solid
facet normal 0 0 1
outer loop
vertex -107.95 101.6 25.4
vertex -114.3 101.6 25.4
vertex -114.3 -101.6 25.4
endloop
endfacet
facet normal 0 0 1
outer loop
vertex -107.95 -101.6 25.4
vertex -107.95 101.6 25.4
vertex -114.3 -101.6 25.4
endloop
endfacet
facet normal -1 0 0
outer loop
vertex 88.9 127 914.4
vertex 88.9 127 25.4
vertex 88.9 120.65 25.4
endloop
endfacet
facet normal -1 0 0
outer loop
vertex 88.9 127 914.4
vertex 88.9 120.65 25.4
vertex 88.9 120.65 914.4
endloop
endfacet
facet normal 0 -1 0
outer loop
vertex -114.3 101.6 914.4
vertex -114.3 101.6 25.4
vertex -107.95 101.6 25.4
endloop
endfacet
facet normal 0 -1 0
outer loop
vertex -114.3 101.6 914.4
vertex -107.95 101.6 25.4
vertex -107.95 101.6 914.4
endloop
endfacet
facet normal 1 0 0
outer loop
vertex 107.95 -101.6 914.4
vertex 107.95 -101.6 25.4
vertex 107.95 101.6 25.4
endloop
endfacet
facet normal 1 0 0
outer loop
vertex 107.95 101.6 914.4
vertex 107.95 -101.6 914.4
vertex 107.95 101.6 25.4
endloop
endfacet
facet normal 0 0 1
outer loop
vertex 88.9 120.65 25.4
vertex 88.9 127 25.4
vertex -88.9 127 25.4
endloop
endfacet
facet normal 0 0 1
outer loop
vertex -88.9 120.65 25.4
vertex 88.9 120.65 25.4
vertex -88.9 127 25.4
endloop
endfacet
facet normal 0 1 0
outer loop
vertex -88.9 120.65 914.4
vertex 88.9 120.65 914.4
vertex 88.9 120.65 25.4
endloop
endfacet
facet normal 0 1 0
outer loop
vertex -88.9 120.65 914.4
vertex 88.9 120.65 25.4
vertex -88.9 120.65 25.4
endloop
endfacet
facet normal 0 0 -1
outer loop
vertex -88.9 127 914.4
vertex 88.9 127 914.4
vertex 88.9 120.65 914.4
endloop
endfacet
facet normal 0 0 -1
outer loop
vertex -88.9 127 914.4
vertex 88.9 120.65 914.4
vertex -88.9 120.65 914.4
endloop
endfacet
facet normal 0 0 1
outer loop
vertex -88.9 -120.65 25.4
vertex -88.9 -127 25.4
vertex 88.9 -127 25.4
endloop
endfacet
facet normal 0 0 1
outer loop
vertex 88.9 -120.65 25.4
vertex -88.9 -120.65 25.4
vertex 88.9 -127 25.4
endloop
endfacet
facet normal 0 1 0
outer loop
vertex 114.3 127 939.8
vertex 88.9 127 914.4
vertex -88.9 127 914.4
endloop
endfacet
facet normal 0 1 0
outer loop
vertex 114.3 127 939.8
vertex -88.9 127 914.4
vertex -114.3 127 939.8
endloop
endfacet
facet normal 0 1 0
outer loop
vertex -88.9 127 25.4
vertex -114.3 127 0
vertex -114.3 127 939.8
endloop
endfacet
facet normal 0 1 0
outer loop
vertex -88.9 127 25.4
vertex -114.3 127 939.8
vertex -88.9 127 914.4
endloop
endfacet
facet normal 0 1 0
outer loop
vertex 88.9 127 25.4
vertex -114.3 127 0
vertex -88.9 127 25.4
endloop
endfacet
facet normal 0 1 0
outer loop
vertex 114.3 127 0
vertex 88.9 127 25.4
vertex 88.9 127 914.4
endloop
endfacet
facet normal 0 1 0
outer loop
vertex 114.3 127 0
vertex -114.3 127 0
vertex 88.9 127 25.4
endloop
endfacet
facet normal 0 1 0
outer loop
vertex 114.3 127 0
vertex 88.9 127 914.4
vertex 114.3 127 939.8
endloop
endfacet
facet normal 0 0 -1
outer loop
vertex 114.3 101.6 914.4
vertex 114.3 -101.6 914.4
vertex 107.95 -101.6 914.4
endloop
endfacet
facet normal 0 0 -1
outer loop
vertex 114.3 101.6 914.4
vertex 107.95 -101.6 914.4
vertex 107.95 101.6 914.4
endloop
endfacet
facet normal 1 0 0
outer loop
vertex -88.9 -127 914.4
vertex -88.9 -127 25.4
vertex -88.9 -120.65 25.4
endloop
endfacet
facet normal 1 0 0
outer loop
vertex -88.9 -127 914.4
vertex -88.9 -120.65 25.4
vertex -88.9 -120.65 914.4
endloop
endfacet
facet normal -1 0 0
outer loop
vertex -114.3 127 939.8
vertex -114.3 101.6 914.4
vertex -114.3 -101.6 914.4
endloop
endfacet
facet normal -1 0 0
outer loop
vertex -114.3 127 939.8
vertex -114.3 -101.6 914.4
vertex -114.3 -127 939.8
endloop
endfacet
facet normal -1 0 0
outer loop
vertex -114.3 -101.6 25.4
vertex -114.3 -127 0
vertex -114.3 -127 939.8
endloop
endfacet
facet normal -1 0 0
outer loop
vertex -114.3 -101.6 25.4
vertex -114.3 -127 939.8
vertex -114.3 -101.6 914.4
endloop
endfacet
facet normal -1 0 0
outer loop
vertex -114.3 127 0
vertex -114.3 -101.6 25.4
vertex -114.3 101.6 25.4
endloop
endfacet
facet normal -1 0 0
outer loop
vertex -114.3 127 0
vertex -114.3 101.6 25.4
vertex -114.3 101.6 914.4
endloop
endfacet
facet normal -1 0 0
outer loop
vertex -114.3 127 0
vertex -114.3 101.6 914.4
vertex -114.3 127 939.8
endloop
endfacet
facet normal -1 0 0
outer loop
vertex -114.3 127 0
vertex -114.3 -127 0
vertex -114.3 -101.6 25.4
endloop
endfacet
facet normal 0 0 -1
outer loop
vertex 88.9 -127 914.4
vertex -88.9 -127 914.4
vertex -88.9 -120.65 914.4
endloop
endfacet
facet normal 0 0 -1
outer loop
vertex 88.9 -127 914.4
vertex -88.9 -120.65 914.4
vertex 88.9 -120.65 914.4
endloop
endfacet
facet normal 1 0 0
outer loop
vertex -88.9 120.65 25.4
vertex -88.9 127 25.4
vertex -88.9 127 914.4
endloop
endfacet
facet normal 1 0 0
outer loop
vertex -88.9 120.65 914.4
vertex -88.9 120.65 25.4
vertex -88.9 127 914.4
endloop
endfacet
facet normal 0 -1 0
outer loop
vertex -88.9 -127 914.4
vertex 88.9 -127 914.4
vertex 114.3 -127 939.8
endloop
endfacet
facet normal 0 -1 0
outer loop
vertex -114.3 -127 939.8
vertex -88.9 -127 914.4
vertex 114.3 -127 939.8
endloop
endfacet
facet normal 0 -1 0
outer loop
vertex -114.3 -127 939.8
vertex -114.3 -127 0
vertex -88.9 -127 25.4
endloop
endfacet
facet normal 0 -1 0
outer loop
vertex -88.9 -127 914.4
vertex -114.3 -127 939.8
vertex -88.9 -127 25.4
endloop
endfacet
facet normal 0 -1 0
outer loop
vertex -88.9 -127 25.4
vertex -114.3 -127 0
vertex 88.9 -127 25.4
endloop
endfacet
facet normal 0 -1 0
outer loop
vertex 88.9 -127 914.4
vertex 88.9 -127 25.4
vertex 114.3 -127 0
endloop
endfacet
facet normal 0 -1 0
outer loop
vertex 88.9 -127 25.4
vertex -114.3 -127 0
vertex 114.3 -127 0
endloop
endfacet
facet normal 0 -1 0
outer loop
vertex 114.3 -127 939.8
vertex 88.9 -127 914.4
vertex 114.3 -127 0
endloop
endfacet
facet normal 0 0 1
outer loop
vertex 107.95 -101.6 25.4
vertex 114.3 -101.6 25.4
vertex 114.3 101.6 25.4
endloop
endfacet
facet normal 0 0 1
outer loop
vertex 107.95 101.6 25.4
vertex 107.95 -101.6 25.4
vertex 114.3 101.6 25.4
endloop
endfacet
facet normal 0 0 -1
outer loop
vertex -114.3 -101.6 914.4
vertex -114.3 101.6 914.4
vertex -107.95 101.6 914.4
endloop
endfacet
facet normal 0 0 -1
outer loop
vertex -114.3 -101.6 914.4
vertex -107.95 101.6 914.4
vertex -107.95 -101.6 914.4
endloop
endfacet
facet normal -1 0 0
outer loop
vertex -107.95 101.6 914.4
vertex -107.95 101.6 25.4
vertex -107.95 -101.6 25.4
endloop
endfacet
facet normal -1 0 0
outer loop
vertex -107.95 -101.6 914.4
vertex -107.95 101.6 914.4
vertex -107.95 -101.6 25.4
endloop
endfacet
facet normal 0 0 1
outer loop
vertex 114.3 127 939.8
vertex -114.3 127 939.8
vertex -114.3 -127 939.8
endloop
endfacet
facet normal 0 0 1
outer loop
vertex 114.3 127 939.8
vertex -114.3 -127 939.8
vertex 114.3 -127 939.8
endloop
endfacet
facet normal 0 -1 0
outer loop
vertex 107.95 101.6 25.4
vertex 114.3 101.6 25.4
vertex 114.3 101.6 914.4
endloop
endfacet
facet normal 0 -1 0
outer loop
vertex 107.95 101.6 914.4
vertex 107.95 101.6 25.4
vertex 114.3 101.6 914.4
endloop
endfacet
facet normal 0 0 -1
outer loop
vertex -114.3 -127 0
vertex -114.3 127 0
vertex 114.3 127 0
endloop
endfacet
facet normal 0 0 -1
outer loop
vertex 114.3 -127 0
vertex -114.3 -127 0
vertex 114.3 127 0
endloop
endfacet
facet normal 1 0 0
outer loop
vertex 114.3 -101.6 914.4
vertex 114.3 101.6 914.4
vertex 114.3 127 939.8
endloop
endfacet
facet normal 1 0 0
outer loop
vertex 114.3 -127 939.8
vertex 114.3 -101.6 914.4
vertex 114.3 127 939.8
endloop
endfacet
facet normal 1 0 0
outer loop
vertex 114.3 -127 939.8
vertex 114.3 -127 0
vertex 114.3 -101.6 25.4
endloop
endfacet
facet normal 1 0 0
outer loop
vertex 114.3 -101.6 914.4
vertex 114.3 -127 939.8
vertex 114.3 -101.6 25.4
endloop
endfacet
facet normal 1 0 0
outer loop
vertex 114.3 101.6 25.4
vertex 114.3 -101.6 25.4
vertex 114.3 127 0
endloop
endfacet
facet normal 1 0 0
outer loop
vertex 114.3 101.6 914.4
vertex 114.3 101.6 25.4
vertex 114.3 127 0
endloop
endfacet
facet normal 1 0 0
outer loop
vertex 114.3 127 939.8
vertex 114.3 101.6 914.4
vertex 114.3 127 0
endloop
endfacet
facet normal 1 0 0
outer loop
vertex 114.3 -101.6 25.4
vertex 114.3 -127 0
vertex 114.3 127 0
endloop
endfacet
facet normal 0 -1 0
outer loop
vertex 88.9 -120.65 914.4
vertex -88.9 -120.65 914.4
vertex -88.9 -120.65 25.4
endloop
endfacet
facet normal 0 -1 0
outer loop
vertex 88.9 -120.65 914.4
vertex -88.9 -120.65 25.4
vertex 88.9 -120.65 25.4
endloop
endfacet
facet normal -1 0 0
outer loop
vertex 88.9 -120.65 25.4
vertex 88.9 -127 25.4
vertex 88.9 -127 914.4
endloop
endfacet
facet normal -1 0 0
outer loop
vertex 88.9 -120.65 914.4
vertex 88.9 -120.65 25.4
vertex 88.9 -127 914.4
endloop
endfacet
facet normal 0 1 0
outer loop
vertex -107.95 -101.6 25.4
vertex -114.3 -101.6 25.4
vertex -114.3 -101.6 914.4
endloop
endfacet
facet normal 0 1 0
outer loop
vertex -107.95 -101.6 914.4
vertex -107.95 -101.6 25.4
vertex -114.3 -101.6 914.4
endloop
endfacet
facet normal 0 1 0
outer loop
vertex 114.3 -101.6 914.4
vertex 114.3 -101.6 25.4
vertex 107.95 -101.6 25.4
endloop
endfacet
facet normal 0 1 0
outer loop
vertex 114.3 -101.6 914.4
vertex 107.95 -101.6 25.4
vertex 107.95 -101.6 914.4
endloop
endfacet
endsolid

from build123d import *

# Parameters (mm, degrees)
F0_W     = 228.6
F0_H     = 254
F1_DEPTH = 939.8
F2_W     = 177.8
F2_H     = 889
F3_DEPTH = 6.35
F4_W     = 203.2
F4_H     = 889
F5_DEPTH = 6.35
F6_W     = 177.8
F6_H     = 889
F7_DEPTH = 6.35
F8_W     = 203.2
F8_H     = 889
F9_DEPTH = 6.35


with BuildPart() as f1:
    # F0 (on Top) → F1 (new body)
    with BuildSketch(Plane.XY):
        Rectangle(F0_W, F0_H)
    extrude(amount=F1_DEPTH)

    # F2 (on face) → F3 (cut)
    with BuildSketch(Plane.XZ.offset(127)):
        with Locations((0, 469.9)):
            Rectangle(F2_W, F2_H)
    extrude(amount=-F3_DEPTH, mode=Mode.SUBTRACT)

    # F4 (on face) → F5 (cut)
    with BuildSketch(Plane.YZ.offset(114.3)):
        with Locations((0, 469.9)):
            Rectangle(F4_W, F4_H)
    extrude(amount=-F5_DEPTH, mode=Mode.SUBTRACT)

    # F6 (on face) → F7 (cut)
    with BuildSketch(Plane(origin=(0, 127, 0), x_dir=(-1, 0, 0), z_dir=(0, 1, 0))):
        with Locations((0, 469.9)):
            Rectangle(F6_W, F6_H)
    extrude(amount=-F7_DEPTH, mode=Mode.SUBTRACT)

    # F8 (on face) → F9 (cut)
    with BuildSketch(Plane(origin=(-114.3, 0, 0), x_dir=(0, -1, 0), z_dir=(-1, 0, 0))):
        with Locations((0, 469.9)):
            Rectangle(F8_W, F8_H)
    extrude(amount=-F9_DEPTH, mode=Mode.SUBTRACT)


solid = f1.part
